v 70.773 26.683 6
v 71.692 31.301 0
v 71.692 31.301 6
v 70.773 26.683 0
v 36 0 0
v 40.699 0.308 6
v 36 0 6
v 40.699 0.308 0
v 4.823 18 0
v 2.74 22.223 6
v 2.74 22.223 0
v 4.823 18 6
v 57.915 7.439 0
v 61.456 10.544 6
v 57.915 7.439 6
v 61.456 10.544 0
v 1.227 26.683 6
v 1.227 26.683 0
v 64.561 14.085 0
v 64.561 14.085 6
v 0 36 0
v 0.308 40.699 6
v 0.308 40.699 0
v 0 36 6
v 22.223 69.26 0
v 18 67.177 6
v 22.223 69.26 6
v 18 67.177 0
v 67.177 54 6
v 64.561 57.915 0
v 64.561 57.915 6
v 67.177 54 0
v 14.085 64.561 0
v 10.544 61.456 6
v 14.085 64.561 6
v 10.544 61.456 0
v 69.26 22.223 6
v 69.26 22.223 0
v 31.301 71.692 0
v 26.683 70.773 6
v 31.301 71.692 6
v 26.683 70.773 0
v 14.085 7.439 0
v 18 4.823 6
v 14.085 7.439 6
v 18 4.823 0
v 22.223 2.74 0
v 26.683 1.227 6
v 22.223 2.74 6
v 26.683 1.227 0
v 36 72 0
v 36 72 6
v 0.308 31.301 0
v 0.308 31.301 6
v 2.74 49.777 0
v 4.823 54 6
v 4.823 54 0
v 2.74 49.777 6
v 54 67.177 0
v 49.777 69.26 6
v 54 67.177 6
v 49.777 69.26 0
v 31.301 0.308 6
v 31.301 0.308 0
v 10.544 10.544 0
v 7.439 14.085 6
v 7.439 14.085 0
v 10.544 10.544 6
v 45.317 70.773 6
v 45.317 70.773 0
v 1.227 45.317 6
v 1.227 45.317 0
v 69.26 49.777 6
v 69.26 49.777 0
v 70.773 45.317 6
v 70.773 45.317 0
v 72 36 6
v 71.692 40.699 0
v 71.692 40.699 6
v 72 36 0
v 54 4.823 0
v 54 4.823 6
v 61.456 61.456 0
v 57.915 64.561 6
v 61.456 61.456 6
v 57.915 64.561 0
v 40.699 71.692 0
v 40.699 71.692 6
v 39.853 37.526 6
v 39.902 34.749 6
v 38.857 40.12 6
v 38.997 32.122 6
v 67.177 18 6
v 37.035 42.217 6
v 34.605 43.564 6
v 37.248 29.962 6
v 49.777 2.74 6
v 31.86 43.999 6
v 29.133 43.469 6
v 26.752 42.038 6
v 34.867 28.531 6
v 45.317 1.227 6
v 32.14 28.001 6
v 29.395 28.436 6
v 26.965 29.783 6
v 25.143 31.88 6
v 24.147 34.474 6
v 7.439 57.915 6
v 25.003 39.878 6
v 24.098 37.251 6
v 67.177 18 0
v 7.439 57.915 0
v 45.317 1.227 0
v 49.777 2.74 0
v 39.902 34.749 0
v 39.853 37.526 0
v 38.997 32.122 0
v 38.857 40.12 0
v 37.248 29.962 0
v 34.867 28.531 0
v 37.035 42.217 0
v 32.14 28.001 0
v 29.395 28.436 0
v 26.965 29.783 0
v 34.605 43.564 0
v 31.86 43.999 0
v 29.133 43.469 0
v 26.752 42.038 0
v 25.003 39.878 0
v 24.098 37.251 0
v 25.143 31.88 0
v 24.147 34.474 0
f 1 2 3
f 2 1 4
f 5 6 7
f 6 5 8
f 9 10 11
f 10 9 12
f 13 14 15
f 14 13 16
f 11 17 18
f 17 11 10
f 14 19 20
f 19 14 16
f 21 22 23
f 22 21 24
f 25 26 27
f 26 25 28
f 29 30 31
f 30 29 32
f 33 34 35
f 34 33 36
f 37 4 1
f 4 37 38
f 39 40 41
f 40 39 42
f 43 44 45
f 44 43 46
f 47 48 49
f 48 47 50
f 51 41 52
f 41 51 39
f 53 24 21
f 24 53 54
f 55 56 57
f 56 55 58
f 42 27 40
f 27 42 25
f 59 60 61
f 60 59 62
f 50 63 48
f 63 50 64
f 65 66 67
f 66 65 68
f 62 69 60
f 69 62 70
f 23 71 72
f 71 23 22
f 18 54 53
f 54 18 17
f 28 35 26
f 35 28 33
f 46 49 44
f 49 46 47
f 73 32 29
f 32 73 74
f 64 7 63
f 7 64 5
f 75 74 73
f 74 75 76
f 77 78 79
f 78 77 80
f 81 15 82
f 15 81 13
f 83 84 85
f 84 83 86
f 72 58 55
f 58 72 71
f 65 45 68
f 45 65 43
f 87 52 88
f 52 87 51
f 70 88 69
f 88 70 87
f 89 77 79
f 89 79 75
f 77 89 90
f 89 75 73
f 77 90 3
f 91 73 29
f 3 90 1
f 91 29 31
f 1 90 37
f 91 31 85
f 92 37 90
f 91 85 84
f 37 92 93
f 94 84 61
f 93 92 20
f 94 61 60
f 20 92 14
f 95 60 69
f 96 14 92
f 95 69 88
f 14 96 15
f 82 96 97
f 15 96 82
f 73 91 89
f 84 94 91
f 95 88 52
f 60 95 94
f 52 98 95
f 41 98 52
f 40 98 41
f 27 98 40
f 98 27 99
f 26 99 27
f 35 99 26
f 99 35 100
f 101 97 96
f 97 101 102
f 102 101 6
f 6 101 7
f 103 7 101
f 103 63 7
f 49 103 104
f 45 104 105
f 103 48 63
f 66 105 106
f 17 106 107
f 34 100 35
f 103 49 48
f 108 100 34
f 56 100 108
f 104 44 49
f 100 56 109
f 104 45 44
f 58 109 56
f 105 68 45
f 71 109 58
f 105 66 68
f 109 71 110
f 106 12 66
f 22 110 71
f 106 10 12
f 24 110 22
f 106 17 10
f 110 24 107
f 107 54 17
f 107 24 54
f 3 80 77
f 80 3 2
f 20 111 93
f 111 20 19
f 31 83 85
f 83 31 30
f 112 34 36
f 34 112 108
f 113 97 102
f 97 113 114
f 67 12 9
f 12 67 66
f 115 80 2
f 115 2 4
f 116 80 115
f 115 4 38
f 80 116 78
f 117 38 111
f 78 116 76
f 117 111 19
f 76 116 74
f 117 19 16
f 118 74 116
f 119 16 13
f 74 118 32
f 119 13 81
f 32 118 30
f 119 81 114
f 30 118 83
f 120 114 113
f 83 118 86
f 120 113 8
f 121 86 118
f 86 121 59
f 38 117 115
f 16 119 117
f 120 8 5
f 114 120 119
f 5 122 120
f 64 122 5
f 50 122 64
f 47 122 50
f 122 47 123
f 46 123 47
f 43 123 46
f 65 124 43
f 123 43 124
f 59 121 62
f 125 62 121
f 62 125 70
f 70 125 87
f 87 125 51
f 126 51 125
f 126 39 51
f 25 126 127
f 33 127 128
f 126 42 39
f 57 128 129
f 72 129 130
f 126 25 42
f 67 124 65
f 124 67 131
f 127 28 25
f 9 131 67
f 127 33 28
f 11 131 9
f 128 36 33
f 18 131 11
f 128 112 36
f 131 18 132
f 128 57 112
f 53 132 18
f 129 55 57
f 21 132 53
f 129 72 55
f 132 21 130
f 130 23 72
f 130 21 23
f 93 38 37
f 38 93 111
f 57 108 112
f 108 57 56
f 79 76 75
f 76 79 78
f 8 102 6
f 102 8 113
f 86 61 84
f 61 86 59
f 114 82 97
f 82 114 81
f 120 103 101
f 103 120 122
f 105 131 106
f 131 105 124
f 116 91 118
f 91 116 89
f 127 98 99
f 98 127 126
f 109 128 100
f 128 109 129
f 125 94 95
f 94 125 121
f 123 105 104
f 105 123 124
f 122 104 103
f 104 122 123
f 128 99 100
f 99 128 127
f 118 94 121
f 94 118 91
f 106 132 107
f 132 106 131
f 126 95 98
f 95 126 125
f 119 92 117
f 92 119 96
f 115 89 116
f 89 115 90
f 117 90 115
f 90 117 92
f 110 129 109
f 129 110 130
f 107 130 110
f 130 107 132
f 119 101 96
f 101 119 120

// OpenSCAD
$fn = 32;

// ----------------------------------------------------------------------
// Cam plate: eccentric cam, base R36
// ----------------------------------------------------------------------

// --- parameters (mm) ---
base_r = 36;              // base circle radius
lobe_h = 14;              // cam lobe rise
bore_r = 8;               // shaft bore radius
plate_t = 6;              // plate thickness, Z (extrusion height)
ecc = 4;                  // disc eccentricity

profile = [[72, 36], [71.692, 40.699], [70.773, 45.317], [69.26, 49.777], [67.177, 54], [64.561, 57.915], [61.456, 61.456], [57.915, 64.561], [54, 67.177], [49.777, 69.26], [45.317, 70.773], [40.699, 71.692], [36, 72], [31.301, 71.692], [26.683, 70.773], [22.223, 69.26], [18, 67.177], [14.085, 64.561], [10.544, 61.456], [7.439, 57.915], [4.823, 54], [2.74, 49.777], [1.227, 45.317], [0.308, 40.699], [0, 36], [0.308, 31.301], [1.227, 26.683], [2.74, 22.223], [4.823, 18], [7.439, 14.085], [10.544, 10.544], [14.085, 7.439], [18, 4.823], [22.223, 2.74], [26.683, 1.227], [31.301, 0.308], [36, 0], [40.699, 0.308], [45.317, 1.227], [49.777, 2.74], [54, 4.823], [57.915, 7.439], [61.456, 10.544], [64.561, 14.085], [67.177, 18], [69.26, 22.223], [70.773, 26.683], [71.692, 31.301]];  // primary outline, 48 points, counter clockwise
void_1 = [[39.853, 37.526], [38.857, 40.12], [37.035, 42.217], [34.605, 43.564], [31.86, 43.999], [29.133, 43.469], [26.752, 42.038], [25.003, 39.878], [24.098, 37.251], [24.147, 34.474], [25.143, 31.88], [26.965, 29.783], [29.395, 28.436], [32.14, 28.001], [34.867, 28.531], [37.248, 29.962], [38.997, 32.122], [39.902, 34.749]];  // shaft bore, 18 points

// --- the one profile operation ---
difference() {
  linear_extrude(height = plate_t) polygon(points = profile);
  translate([0, 0, -1])
    linear_extrude(height = plate_t + 2) polygon(points = void_1);
}
